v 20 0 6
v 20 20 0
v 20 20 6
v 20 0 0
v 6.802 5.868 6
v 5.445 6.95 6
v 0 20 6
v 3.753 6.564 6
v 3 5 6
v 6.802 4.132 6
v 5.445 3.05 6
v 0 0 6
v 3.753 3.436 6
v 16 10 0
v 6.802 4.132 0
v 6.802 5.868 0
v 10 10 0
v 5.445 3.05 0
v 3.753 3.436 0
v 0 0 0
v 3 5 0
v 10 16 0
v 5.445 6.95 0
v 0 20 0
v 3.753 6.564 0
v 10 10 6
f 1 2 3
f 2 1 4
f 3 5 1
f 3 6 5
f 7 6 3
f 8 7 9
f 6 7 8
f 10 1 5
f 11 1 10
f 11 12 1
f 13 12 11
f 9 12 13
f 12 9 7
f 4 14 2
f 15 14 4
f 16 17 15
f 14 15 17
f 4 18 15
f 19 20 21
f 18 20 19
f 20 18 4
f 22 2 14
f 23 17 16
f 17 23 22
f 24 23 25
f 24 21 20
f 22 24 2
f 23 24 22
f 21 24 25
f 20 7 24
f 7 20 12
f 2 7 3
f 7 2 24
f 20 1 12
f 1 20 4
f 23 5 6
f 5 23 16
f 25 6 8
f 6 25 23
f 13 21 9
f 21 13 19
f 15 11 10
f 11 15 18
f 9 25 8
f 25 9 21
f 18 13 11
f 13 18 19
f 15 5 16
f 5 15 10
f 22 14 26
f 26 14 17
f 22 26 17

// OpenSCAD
difference() {
    cube([20,20,6]);
    translate([5,5,0]) rotate_extrude()
        polygon([[0,0],[2,0],[2,8],[0,8]]);
    translate([10,10,0]) polyhedron(
        points=[[0,0,0],[6,0,0],[0,6,0],[0,0,6]],
        faces=[[0,1,2],[0,3,1],[0,2,3],[1,3,2]]);
}
